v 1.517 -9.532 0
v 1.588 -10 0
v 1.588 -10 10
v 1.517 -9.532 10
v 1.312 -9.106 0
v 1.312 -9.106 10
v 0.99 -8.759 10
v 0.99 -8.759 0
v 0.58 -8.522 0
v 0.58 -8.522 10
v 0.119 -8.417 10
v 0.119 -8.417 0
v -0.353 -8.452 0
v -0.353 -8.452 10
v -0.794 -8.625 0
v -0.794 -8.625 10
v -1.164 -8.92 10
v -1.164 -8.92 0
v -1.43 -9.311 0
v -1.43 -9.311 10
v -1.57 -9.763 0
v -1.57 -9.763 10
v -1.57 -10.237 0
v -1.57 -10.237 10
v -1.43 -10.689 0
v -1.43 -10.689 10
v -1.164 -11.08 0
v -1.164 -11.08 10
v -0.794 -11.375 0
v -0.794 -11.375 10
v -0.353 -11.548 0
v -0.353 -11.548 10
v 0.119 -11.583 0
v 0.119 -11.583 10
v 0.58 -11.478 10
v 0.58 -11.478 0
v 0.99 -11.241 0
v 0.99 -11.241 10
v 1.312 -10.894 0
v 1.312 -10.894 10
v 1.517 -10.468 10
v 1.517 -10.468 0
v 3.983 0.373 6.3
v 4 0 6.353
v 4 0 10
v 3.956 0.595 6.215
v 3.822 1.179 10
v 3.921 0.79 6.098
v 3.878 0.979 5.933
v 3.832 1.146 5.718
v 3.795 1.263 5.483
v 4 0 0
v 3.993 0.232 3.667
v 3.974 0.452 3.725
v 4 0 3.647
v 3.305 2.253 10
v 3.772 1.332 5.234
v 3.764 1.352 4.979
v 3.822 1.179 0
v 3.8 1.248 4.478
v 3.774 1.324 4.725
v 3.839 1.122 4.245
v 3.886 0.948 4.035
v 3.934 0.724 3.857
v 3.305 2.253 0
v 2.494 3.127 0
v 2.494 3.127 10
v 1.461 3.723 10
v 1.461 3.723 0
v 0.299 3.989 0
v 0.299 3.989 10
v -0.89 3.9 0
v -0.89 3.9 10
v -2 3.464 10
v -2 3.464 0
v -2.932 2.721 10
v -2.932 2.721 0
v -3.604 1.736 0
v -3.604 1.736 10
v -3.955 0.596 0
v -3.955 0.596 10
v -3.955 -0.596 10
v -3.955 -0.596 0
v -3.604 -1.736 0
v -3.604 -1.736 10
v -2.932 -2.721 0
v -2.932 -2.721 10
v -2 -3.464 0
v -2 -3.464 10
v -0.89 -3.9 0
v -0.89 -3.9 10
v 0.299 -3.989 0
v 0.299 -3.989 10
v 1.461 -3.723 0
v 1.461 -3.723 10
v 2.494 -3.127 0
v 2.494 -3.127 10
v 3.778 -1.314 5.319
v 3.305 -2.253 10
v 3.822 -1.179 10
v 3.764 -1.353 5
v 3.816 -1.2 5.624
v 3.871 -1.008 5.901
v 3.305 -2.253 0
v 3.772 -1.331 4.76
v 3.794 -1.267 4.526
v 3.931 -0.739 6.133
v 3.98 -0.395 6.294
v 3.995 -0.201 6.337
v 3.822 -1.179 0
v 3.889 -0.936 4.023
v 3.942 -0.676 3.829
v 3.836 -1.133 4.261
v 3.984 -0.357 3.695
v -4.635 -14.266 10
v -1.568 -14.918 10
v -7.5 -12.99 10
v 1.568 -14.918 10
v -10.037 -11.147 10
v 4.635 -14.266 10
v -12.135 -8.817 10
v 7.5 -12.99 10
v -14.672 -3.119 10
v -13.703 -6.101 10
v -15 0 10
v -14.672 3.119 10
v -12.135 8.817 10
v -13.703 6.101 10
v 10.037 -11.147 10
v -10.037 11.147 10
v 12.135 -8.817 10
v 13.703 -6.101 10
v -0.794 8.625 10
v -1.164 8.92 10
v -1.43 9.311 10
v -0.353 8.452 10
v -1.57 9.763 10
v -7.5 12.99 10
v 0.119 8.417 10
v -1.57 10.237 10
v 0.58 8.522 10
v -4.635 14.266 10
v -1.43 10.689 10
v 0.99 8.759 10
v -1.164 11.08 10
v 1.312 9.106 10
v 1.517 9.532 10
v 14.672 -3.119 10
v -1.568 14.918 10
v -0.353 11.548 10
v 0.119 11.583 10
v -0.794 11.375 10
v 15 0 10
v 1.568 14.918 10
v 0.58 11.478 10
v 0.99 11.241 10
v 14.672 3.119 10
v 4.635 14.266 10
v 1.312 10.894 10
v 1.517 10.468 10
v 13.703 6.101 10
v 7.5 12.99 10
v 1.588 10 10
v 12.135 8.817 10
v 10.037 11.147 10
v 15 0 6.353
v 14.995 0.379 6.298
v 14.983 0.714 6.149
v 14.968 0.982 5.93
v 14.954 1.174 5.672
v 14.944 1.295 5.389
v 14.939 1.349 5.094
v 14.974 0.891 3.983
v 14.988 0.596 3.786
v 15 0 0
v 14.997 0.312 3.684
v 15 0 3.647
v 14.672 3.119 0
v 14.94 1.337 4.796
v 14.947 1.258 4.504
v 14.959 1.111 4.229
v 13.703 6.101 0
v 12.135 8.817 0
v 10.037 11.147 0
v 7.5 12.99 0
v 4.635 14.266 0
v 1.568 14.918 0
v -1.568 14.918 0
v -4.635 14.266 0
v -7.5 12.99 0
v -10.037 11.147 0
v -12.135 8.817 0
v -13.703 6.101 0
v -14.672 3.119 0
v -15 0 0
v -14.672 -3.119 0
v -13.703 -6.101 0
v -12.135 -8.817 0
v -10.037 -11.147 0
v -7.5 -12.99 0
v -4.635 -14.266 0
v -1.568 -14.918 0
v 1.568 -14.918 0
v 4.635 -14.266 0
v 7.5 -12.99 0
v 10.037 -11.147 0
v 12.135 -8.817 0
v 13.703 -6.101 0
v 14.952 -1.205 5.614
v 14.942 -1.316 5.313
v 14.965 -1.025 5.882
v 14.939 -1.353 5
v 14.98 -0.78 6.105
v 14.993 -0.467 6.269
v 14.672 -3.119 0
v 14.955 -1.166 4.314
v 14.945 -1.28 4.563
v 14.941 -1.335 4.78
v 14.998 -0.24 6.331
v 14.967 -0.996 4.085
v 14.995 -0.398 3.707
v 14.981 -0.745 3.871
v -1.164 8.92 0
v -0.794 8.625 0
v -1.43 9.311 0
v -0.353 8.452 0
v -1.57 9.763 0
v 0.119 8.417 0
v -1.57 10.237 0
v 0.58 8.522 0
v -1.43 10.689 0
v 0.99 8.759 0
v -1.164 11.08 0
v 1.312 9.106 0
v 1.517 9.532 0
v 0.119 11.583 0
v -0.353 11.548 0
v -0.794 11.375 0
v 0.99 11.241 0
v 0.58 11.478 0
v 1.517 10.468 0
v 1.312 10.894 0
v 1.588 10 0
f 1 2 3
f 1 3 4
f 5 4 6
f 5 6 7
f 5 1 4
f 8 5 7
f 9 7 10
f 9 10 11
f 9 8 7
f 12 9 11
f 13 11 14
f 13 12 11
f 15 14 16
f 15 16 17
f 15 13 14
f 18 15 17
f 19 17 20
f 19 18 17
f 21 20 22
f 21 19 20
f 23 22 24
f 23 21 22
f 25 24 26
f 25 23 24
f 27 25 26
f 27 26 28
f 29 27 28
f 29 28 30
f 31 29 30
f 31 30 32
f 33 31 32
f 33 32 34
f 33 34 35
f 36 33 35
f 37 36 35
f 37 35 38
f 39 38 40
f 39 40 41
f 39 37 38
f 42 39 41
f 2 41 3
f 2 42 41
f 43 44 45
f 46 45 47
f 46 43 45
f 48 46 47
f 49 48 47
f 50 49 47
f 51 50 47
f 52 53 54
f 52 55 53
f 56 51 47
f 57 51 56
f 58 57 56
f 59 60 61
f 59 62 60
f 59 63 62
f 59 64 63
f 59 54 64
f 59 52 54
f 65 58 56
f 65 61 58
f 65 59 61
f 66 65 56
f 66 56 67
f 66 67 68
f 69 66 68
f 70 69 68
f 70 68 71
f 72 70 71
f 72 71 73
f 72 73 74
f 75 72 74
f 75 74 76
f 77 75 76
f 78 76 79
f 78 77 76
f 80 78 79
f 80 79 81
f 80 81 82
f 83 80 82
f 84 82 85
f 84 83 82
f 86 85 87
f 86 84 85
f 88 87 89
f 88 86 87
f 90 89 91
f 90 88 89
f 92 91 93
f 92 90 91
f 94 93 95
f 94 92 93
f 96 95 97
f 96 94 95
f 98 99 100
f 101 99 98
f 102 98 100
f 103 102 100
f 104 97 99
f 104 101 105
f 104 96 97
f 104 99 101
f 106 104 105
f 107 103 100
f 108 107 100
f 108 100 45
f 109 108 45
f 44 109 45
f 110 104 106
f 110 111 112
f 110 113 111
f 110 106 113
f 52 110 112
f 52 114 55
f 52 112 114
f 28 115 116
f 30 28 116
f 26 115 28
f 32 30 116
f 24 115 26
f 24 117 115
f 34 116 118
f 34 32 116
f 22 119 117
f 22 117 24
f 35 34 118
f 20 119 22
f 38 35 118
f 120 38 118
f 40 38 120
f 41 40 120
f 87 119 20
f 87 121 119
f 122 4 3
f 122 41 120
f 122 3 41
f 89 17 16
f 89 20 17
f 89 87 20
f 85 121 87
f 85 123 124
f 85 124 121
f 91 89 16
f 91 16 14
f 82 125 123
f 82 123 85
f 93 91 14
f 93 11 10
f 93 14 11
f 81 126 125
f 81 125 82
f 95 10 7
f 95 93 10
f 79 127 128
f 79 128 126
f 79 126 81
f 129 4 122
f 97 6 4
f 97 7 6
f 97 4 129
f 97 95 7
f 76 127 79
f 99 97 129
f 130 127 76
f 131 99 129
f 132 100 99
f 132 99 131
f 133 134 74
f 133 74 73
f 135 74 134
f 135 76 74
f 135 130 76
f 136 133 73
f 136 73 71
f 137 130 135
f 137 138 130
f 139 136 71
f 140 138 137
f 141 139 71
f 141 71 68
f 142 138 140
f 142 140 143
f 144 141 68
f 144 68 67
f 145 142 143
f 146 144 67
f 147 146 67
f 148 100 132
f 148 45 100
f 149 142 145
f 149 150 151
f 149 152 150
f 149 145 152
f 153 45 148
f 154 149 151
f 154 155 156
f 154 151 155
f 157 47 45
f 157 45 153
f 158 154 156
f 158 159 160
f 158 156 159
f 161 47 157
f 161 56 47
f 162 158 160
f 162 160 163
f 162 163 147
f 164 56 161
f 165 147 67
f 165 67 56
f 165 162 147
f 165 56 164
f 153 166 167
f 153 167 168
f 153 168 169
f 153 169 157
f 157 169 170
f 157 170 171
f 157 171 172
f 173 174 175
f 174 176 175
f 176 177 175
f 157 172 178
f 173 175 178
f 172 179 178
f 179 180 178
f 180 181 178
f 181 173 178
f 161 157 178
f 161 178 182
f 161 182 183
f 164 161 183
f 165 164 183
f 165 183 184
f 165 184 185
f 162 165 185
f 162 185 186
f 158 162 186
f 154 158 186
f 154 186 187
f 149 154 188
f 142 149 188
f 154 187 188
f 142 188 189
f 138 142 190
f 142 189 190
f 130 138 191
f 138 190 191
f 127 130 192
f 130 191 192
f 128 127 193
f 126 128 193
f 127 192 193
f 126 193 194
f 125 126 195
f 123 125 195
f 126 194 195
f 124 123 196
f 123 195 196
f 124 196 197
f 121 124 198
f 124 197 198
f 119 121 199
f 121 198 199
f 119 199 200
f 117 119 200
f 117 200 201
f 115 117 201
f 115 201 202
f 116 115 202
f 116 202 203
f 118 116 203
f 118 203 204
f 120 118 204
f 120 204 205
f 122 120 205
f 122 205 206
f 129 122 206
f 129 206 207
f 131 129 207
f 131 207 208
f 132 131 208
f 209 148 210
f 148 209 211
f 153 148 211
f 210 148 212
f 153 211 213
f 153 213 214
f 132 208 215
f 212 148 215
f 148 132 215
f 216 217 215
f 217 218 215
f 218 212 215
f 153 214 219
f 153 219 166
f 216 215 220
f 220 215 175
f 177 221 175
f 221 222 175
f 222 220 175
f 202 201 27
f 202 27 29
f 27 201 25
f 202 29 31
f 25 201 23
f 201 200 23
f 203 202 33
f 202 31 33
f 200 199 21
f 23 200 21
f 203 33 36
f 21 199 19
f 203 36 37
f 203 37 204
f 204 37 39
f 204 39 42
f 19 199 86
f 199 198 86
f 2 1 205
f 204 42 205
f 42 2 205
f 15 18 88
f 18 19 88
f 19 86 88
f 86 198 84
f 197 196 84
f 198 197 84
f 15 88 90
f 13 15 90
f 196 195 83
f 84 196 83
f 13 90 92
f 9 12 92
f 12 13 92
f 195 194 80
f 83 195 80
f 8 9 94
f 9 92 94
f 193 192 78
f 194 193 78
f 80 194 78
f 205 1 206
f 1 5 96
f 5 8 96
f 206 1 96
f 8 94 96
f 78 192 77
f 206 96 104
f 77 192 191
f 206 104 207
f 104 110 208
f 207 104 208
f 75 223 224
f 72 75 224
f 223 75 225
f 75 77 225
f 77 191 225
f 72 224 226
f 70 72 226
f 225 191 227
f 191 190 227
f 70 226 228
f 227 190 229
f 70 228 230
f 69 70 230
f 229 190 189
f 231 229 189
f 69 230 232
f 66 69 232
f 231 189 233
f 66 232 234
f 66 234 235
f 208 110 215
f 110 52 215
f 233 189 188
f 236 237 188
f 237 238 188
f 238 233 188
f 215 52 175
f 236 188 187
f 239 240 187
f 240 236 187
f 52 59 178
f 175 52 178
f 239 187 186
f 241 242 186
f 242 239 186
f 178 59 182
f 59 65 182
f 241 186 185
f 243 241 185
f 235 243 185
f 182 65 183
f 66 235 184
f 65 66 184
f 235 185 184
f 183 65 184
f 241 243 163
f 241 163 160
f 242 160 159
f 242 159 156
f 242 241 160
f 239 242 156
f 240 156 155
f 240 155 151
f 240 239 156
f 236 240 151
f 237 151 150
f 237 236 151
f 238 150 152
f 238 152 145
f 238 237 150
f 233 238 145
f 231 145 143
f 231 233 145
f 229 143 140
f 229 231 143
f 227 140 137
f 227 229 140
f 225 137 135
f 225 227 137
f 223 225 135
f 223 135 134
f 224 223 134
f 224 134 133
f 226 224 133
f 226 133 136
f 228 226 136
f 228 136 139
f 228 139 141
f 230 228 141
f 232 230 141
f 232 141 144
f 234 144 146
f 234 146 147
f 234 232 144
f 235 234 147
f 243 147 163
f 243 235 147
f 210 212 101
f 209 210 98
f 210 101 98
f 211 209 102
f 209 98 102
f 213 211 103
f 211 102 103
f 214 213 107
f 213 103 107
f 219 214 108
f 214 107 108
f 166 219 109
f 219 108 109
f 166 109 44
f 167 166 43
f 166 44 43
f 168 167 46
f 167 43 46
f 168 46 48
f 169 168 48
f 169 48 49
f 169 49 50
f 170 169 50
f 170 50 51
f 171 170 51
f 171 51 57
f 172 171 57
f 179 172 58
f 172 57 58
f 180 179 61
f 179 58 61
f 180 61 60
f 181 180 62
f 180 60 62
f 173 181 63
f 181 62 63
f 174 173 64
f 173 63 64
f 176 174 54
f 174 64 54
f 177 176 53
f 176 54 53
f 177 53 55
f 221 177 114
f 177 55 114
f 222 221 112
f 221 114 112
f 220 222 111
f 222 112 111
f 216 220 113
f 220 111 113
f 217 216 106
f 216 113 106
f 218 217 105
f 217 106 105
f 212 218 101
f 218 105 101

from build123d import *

# Parameters (mm, degrees)
SKETCH1_R                 = 15
SKETCH1_R_2               = 1.5875
SKETCH1_R_3               = 4
BOSS_EXTRUDE2_DEPTH       = 10
F_6_32_TAPPED_HOLE1_D     = 2.7051
F_6_32_TAPPED_HOLE1_DEPTH = 14.999
F_6_32_TAPPED_HOLE1_TIP   = 0.81269403


with BuildPart() as part:
    # Sketch1 → Boss-Extrude2 (new body)
    with BuildSketch(Plane.XY):
        Circle(SKETCH1_R)
        with Locations((0, 10)):
            Circle(SKETCH1_R_2, mode=Mode.SUBTRACT)
        Circle(SKETCH1_R_3, mode=Mode.SUBTRACT)
        with Locations((0, -10)):
            Circle(SKETCH1_R_2, mode=Mode.SUBTRACT)
    extrude(amount=BOSS_EXTRUDE2_DEPTH)

    # #6-32 Tapped Hole1
    with Locations(Plane(origin=(15, 0, 4.999999906), x_dir=(0, 1, 0), z_dir=(1, 0, 0))):
        with Locations((0, 0)):
            Hole(F_6_32_TAPPED_HOLE1_D / 2, depth=F_6_32_TAPPED_HOLE1_DEPTH)
            with Locations((0, 0, -(F_6_32_TAPPED_HOLE1_DEPTH + F_6_32_TAPPED_HOLE1_TIP / 2))):  # 118° drill point
                Cone(0, F_6_32_TAPPED_HOLE1_D / 2, F_6_32_TAPPED_HOLE1_TIP, mode=Mode.SUBTRACT)


solid = part.part
